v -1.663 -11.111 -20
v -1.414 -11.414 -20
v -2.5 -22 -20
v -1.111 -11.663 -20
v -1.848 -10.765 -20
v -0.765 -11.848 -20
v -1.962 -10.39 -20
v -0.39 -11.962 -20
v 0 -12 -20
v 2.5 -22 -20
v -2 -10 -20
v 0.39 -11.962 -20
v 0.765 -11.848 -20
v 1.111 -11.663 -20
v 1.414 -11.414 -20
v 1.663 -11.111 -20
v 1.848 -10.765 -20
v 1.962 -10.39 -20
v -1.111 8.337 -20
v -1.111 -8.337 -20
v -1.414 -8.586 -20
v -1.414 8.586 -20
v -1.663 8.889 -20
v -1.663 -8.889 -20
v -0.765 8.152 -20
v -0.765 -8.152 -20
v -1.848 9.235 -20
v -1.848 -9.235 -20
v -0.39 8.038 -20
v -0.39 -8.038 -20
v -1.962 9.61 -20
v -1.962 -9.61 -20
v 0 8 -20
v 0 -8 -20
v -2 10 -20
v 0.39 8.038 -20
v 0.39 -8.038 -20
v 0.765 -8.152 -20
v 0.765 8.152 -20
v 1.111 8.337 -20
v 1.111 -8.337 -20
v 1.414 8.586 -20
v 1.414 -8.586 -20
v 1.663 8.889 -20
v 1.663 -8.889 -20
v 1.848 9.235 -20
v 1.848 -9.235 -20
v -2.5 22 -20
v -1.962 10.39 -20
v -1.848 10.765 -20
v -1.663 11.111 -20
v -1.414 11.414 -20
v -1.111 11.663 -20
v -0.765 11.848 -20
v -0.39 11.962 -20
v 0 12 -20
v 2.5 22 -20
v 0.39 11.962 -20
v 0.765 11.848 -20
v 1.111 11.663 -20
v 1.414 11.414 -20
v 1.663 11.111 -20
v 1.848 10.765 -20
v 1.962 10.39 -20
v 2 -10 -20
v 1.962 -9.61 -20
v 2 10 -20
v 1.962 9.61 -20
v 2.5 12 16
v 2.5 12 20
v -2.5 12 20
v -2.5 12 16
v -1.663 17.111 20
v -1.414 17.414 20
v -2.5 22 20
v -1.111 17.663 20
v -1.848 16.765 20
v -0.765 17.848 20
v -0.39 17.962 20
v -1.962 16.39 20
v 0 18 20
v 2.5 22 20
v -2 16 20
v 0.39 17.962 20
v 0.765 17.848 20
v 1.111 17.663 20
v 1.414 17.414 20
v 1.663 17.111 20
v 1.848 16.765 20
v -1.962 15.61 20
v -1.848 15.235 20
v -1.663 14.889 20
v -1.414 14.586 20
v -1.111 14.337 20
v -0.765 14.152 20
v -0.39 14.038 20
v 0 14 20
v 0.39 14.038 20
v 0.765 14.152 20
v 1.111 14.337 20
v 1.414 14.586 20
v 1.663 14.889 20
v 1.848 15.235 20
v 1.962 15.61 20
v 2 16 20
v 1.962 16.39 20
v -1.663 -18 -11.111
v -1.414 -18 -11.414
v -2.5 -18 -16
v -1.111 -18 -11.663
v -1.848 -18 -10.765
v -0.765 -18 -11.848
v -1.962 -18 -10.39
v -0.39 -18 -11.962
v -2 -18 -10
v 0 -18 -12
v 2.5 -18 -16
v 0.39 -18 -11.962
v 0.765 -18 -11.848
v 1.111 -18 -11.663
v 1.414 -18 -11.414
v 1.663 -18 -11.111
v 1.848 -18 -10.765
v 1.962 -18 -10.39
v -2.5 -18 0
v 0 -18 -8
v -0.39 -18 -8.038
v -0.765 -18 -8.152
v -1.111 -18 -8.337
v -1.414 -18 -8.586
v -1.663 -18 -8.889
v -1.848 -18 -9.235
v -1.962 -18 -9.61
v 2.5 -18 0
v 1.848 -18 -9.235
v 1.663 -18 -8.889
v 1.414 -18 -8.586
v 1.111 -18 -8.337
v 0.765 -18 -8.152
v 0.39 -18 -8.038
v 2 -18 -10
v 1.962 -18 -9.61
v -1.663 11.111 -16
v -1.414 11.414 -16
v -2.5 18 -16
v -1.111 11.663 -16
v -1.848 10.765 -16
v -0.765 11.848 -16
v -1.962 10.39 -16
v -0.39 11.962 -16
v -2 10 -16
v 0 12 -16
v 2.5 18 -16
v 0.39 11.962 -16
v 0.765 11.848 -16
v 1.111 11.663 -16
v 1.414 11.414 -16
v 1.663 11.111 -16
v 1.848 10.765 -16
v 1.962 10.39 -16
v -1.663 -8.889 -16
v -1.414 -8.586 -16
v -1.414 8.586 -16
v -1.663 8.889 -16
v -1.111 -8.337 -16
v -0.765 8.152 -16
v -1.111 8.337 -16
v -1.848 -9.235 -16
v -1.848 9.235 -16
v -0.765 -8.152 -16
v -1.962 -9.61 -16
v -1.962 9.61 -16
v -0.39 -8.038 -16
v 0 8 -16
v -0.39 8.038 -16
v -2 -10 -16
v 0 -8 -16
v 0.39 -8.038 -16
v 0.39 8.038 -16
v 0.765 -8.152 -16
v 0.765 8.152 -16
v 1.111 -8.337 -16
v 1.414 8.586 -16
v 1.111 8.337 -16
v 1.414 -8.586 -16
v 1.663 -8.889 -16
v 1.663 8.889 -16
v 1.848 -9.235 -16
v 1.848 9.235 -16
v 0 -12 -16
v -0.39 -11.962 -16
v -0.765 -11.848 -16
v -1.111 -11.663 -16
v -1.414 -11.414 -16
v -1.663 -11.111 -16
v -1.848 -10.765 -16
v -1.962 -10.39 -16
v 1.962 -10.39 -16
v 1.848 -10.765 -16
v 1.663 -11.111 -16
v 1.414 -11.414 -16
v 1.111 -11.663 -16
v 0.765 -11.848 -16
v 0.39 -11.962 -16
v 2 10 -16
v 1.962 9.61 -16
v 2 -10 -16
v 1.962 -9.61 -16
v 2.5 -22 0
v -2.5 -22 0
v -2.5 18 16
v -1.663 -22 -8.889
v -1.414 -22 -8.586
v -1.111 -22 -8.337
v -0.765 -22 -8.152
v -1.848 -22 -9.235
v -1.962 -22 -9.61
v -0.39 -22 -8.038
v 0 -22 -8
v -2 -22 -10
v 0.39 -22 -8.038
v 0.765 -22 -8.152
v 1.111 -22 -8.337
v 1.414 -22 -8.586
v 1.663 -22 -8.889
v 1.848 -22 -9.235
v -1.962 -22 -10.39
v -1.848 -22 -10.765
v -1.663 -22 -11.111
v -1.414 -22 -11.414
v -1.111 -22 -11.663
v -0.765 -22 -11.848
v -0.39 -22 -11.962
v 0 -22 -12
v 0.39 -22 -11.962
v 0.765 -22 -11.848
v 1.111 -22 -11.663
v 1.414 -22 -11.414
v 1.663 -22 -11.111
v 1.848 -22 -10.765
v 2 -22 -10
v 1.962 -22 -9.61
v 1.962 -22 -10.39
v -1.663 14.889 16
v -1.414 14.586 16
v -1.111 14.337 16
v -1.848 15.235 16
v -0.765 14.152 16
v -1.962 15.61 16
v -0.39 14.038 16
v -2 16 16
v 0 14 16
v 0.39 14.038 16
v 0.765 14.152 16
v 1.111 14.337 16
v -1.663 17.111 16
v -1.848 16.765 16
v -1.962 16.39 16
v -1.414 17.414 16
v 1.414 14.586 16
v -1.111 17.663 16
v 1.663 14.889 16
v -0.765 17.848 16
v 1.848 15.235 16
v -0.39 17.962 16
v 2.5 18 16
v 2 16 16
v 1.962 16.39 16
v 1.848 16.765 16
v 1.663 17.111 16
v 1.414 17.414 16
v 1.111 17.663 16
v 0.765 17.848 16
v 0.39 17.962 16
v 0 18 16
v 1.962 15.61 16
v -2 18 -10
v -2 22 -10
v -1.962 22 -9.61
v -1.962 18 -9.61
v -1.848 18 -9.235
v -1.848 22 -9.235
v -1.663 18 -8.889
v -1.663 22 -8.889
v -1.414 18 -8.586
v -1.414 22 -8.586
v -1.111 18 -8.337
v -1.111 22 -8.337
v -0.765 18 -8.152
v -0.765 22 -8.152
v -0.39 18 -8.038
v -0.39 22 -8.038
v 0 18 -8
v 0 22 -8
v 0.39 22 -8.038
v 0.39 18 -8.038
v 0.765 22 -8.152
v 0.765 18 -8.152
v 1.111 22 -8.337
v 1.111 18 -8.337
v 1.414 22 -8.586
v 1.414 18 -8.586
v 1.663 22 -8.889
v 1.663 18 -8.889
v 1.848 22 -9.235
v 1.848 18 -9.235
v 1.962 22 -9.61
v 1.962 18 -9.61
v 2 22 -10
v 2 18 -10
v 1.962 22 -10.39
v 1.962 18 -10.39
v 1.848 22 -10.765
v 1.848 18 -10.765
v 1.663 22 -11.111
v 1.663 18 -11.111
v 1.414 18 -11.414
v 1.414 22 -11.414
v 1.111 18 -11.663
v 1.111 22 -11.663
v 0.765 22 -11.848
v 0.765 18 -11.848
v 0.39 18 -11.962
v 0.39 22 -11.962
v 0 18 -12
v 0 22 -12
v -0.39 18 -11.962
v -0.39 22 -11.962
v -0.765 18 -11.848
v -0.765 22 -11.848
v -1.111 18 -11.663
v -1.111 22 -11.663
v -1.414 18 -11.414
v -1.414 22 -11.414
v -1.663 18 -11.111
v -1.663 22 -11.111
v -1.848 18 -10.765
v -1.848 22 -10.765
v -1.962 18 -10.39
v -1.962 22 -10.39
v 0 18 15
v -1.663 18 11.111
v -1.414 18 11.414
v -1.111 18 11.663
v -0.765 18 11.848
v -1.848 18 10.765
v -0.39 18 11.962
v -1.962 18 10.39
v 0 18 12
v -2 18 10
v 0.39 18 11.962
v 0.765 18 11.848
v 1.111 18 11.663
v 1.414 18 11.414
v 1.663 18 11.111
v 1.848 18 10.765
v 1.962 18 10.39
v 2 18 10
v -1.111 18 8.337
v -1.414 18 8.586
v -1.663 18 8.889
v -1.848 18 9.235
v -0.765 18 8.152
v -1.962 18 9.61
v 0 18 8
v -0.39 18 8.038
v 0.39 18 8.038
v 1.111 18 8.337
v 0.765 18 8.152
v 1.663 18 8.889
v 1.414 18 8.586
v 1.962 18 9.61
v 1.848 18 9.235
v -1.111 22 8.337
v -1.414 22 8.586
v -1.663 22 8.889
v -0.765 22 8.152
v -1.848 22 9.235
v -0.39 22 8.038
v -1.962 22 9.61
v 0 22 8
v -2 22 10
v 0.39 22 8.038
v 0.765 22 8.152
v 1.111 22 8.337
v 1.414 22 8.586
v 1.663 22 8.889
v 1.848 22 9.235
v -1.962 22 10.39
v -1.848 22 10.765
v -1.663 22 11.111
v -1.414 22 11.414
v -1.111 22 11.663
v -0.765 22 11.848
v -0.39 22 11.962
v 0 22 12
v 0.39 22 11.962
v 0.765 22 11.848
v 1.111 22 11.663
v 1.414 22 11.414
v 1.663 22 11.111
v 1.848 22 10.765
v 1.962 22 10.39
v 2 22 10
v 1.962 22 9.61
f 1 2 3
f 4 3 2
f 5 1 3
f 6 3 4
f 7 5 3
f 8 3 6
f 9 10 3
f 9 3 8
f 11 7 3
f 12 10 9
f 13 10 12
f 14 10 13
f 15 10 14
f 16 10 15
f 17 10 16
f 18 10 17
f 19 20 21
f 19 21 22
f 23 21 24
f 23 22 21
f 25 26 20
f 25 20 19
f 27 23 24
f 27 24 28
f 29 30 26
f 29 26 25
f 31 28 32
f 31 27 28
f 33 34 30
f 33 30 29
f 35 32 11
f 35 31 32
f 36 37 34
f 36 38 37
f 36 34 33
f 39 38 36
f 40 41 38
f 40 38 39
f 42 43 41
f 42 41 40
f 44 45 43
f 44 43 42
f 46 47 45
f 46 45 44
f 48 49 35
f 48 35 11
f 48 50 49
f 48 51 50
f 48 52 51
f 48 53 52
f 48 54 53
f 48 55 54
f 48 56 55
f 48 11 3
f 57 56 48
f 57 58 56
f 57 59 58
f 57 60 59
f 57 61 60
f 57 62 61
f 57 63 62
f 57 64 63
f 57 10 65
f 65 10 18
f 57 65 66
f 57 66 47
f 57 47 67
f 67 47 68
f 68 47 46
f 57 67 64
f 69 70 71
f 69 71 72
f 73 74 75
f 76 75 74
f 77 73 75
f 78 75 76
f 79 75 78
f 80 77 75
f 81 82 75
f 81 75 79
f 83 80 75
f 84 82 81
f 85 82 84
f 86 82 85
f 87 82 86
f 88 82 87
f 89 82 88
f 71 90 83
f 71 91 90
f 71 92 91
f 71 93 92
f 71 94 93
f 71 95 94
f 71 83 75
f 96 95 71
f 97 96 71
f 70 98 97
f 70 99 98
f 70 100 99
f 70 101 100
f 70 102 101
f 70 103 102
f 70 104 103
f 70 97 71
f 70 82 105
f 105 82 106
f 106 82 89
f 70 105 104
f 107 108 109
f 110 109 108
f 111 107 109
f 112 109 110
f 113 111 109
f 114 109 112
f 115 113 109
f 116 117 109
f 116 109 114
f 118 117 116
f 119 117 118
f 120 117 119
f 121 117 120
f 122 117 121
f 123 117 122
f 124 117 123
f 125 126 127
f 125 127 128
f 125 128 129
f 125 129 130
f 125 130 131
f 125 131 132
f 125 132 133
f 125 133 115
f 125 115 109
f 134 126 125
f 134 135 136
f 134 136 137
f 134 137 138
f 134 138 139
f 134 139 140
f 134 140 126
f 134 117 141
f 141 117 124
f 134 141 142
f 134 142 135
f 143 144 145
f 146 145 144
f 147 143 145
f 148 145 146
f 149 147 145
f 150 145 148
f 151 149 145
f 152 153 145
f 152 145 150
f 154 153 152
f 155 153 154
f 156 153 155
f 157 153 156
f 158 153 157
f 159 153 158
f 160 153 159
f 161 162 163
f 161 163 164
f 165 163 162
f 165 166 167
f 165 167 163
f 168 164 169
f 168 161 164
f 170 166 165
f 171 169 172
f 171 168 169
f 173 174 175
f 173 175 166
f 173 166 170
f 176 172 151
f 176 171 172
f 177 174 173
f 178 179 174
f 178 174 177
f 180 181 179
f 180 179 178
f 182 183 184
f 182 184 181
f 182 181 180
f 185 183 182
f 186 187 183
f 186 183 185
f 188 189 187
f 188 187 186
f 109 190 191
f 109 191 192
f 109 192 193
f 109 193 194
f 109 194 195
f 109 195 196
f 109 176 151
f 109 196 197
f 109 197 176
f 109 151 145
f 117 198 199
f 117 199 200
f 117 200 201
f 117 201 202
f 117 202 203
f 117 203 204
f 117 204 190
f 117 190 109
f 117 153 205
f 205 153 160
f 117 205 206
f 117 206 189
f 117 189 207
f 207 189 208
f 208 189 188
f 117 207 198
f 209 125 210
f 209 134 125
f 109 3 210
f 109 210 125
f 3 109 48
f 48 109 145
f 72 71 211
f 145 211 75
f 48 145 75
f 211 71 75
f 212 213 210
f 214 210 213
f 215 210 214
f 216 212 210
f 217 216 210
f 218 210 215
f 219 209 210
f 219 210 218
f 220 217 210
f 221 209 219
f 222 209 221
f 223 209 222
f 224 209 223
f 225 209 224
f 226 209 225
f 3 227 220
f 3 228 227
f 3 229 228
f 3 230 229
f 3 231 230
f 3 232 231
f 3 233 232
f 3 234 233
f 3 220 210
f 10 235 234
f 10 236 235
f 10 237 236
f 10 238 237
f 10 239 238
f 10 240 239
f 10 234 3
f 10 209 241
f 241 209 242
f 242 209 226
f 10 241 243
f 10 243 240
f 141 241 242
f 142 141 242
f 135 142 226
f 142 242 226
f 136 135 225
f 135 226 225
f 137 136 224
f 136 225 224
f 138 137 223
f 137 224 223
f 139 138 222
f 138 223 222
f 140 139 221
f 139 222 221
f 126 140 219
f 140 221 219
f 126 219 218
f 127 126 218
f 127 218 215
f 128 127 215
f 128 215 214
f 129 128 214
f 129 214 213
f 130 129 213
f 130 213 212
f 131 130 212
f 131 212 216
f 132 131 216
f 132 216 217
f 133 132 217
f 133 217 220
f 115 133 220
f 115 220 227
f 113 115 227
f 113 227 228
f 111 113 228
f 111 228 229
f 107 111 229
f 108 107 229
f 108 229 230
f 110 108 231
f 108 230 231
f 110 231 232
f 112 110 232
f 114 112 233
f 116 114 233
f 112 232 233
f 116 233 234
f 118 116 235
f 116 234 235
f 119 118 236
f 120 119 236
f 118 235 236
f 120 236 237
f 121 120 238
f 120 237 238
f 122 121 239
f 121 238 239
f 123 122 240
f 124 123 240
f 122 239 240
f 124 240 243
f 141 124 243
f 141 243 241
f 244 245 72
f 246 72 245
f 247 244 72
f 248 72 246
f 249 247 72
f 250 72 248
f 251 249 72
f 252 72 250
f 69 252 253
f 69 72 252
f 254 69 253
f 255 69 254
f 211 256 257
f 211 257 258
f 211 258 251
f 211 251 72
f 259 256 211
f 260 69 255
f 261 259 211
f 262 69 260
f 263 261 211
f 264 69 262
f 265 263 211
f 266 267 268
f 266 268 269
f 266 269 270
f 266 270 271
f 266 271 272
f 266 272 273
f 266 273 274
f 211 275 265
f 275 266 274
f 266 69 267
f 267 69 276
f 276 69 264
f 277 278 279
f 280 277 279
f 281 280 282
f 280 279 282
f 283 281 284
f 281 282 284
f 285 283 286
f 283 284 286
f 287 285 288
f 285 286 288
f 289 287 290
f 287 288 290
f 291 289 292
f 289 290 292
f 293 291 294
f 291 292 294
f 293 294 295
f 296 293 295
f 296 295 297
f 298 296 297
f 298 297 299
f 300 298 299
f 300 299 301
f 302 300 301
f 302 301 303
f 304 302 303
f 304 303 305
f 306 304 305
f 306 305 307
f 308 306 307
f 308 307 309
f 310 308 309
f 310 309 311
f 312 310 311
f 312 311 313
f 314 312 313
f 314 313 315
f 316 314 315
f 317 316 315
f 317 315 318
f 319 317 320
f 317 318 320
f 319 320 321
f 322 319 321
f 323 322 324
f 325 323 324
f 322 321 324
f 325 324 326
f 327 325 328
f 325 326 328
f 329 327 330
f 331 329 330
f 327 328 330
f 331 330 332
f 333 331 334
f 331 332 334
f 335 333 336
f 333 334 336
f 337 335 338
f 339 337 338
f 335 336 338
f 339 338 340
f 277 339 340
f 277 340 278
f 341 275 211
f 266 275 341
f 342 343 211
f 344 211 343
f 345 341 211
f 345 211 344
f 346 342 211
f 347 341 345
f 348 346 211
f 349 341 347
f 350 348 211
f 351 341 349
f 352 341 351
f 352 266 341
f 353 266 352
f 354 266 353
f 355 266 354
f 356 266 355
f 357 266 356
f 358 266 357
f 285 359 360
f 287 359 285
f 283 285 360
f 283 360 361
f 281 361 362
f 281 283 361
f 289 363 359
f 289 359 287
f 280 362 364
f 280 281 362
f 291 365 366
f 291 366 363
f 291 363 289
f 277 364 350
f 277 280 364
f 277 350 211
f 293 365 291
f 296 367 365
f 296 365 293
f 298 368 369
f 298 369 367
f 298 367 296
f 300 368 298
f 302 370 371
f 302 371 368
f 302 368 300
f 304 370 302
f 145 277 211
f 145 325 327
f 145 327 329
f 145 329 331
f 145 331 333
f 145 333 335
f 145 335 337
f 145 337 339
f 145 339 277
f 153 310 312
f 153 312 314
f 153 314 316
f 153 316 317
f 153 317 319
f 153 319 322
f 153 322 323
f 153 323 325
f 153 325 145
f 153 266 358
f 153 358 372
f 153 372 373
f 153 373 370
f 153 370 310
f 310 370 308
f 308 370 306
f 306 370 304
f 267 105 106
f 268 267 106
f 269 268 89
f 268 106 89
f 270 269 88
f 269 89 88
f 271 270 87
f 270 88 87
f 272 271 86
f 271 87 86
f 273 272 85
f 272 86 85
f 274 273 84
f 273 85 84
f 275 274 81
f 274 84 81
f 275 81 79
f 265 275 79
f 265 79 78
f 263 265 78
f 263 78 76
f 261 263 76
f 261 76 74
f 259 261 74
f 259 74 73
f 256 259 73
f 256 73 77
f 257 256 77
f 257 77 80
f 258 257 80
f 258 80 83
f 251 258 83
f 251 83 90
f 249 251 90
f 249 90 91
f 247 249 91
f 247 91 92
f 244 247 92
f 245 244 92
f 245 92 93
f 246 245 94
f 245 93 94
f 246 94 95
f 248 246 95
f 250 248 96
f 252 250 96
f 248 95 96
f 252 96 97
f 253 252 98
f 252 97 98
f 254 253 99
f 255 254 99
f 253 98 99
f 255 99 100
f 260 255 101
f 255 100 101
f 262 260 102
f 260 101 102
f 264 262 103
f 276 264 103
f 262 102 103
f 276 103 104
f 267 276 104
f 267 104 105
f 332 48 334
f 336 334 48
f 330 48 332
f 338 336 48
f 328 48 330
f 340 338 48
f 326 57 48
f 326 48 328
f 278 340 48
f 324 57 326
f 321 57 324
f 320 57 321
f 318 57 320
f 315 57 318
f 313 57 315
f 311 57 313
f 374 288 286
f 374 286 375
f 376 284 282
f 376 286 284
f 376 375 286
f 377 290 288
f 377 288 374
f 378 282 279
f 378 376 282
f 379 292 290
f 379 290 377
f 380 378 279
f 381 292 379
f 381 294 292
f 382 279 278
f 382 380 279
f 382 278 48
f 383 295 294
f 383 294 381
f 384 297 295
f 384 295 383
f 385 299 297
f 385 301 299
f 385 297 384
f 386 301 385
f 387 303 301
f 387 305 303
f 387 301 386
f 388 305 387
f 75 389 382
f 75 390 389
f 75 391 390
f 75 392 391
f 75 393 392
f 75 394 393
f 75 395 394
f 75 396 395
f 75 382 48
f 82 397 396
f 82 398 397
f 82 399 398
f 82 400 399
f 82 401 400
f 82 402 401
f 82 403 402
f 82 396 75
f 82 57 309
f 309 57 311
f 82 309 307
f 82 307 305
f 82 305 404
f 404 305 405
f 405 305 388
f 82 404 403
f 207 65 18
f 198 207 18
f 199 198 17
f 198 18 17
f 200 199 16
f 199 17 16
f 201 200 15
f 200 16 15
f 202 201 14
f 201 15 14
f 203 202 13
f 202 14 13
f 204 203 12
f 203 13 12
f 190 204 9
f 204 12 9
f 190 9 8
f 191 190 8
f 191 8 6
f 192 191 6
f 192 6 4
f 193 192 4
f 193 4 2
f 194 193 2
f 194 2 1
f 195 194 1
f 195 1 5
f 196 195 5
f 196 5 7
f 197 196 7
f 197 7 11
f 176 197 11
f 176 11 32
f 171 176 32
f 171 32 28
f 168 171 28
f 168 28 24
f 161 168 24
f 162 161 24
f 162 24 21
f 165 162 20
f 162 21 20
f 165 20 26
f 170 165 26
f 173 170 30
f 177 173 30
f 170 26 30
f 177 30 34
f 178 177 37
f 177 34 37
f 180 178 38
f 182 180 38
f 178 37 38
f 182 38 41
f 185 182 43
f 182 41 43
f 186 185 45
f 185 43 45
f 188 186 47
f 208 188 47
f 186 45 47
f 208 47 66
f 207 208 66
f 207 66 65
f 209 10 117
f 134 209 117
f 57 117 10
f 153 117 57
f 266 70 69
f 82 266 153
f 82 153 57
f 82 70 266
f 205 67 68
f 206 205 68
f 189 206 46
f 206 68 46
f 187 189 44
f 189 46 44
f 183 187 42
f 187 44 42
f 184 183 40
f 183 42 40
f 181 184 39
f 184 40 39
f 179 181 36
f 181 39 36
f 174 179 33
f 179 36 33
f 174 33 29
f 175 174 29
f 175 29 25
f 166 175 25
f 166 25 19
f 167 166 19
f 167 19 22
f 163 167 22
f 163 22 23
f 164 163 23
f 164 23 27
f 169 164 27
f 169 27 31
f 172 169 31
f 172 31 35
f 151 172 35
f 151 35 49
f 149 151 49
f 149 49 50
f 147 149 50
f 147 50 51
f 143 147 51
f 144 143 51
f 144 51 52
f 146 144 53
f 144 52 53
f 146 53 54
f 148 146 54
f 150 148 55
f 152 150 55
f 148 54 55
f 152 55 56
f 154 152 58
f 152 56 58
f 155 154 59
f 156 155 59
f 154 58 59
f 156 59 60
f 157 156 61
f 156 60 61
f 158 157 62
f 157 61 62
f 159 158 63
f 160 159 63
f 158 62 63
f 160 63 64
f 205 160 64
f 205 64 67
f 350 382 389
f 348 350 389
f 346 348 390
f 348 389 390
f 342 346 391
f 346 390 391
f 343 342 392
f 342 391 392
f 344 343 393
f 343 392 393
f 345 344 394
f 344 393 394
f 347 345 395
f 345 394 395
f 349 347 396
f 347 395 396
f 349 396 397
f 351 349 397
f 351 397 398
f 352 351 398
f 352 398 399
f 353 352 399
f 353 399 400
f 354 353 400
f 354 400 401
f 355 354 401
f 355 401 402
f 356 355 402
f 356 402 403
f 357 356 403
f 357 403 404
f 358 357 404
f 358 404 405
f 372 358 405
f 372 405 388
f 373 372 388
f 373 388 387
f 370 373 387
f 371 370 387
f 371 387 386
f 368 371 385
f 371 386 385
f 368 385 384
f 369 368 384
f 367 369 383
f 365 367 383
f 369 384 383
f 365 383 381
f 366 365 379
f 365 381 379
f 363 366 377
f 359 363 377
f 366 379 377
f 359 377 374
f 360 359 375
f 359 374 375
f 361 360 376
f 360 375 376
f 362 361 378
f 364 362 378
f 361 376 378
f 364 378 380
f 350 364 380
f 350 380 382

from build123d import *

# Parameters (mm, degrees)
F1_DEPTH = 2.5
F2_R     = 2
F3_DEPTH = 5
F4_R     = 2
F5_DEPTH = 5
F6_R     = 2
F7_DEPTH = 25
F8_R     = 2
F9_DEPTH = 5


with BuildPart() as f1:
    # F0 (on Right) → F1 (new body, symmetric)
    with BuildSketch(Plane.YZ):
        Polygon((-22, -20), (22, -20), (22, 20), (12, 20), (12, 16), (18, 16), (18, -16), (-18, -16), (-18, 0), (-22, 0), align=None)
    extrude(amount=F1_DEPTH, both=True)

    # F2 (on face) → F3 (cut)
    with BuildSketch(Plane.XY.offset(20)):
        with Locations((0, 16)):
            Circle(F2_R)
    extrude(amount=-F3_DEPTH, mode=Mode.SUBTRACT)

    # F4 (on face) → F5 (cut)
    with BuildSketch(Plane(origin=(0, 0, -20), x_dir=(1, 0, 0), z_dir=(0, 0, -1))):
        with Locations((0, 10)):
            Circle(F4_R)
        with Locations((0, -10)):
            Circle(F4_R)
    extrude(amount=-F5_DEPTH, mode=Mode.SUBTRACT)

    # F6 (on face) → F7 (cut)
    with BuildSketch(Plane.XZ.offset(22)):
        with Locations((0, -10)):
            Circle(F6_R)
    extrude(amount=-F7_DEPTH, mode=Mode.SUBTRACT)

    # F8 (on face) → F9 (cut)
    with BuildSketch(Plane(origin=(0, 22, 0), x_dir=(-1, 0, 0), z_dir=(0, 1, 0))):
        with Locations((0, -10)):
            Circle(F8_R)
        with Locations((0, 10)):
            Circle(F8_R)
    extrude(amount=-F9_DEPTH, mode=Mode.SUBTRACT)


solid = f1.part
